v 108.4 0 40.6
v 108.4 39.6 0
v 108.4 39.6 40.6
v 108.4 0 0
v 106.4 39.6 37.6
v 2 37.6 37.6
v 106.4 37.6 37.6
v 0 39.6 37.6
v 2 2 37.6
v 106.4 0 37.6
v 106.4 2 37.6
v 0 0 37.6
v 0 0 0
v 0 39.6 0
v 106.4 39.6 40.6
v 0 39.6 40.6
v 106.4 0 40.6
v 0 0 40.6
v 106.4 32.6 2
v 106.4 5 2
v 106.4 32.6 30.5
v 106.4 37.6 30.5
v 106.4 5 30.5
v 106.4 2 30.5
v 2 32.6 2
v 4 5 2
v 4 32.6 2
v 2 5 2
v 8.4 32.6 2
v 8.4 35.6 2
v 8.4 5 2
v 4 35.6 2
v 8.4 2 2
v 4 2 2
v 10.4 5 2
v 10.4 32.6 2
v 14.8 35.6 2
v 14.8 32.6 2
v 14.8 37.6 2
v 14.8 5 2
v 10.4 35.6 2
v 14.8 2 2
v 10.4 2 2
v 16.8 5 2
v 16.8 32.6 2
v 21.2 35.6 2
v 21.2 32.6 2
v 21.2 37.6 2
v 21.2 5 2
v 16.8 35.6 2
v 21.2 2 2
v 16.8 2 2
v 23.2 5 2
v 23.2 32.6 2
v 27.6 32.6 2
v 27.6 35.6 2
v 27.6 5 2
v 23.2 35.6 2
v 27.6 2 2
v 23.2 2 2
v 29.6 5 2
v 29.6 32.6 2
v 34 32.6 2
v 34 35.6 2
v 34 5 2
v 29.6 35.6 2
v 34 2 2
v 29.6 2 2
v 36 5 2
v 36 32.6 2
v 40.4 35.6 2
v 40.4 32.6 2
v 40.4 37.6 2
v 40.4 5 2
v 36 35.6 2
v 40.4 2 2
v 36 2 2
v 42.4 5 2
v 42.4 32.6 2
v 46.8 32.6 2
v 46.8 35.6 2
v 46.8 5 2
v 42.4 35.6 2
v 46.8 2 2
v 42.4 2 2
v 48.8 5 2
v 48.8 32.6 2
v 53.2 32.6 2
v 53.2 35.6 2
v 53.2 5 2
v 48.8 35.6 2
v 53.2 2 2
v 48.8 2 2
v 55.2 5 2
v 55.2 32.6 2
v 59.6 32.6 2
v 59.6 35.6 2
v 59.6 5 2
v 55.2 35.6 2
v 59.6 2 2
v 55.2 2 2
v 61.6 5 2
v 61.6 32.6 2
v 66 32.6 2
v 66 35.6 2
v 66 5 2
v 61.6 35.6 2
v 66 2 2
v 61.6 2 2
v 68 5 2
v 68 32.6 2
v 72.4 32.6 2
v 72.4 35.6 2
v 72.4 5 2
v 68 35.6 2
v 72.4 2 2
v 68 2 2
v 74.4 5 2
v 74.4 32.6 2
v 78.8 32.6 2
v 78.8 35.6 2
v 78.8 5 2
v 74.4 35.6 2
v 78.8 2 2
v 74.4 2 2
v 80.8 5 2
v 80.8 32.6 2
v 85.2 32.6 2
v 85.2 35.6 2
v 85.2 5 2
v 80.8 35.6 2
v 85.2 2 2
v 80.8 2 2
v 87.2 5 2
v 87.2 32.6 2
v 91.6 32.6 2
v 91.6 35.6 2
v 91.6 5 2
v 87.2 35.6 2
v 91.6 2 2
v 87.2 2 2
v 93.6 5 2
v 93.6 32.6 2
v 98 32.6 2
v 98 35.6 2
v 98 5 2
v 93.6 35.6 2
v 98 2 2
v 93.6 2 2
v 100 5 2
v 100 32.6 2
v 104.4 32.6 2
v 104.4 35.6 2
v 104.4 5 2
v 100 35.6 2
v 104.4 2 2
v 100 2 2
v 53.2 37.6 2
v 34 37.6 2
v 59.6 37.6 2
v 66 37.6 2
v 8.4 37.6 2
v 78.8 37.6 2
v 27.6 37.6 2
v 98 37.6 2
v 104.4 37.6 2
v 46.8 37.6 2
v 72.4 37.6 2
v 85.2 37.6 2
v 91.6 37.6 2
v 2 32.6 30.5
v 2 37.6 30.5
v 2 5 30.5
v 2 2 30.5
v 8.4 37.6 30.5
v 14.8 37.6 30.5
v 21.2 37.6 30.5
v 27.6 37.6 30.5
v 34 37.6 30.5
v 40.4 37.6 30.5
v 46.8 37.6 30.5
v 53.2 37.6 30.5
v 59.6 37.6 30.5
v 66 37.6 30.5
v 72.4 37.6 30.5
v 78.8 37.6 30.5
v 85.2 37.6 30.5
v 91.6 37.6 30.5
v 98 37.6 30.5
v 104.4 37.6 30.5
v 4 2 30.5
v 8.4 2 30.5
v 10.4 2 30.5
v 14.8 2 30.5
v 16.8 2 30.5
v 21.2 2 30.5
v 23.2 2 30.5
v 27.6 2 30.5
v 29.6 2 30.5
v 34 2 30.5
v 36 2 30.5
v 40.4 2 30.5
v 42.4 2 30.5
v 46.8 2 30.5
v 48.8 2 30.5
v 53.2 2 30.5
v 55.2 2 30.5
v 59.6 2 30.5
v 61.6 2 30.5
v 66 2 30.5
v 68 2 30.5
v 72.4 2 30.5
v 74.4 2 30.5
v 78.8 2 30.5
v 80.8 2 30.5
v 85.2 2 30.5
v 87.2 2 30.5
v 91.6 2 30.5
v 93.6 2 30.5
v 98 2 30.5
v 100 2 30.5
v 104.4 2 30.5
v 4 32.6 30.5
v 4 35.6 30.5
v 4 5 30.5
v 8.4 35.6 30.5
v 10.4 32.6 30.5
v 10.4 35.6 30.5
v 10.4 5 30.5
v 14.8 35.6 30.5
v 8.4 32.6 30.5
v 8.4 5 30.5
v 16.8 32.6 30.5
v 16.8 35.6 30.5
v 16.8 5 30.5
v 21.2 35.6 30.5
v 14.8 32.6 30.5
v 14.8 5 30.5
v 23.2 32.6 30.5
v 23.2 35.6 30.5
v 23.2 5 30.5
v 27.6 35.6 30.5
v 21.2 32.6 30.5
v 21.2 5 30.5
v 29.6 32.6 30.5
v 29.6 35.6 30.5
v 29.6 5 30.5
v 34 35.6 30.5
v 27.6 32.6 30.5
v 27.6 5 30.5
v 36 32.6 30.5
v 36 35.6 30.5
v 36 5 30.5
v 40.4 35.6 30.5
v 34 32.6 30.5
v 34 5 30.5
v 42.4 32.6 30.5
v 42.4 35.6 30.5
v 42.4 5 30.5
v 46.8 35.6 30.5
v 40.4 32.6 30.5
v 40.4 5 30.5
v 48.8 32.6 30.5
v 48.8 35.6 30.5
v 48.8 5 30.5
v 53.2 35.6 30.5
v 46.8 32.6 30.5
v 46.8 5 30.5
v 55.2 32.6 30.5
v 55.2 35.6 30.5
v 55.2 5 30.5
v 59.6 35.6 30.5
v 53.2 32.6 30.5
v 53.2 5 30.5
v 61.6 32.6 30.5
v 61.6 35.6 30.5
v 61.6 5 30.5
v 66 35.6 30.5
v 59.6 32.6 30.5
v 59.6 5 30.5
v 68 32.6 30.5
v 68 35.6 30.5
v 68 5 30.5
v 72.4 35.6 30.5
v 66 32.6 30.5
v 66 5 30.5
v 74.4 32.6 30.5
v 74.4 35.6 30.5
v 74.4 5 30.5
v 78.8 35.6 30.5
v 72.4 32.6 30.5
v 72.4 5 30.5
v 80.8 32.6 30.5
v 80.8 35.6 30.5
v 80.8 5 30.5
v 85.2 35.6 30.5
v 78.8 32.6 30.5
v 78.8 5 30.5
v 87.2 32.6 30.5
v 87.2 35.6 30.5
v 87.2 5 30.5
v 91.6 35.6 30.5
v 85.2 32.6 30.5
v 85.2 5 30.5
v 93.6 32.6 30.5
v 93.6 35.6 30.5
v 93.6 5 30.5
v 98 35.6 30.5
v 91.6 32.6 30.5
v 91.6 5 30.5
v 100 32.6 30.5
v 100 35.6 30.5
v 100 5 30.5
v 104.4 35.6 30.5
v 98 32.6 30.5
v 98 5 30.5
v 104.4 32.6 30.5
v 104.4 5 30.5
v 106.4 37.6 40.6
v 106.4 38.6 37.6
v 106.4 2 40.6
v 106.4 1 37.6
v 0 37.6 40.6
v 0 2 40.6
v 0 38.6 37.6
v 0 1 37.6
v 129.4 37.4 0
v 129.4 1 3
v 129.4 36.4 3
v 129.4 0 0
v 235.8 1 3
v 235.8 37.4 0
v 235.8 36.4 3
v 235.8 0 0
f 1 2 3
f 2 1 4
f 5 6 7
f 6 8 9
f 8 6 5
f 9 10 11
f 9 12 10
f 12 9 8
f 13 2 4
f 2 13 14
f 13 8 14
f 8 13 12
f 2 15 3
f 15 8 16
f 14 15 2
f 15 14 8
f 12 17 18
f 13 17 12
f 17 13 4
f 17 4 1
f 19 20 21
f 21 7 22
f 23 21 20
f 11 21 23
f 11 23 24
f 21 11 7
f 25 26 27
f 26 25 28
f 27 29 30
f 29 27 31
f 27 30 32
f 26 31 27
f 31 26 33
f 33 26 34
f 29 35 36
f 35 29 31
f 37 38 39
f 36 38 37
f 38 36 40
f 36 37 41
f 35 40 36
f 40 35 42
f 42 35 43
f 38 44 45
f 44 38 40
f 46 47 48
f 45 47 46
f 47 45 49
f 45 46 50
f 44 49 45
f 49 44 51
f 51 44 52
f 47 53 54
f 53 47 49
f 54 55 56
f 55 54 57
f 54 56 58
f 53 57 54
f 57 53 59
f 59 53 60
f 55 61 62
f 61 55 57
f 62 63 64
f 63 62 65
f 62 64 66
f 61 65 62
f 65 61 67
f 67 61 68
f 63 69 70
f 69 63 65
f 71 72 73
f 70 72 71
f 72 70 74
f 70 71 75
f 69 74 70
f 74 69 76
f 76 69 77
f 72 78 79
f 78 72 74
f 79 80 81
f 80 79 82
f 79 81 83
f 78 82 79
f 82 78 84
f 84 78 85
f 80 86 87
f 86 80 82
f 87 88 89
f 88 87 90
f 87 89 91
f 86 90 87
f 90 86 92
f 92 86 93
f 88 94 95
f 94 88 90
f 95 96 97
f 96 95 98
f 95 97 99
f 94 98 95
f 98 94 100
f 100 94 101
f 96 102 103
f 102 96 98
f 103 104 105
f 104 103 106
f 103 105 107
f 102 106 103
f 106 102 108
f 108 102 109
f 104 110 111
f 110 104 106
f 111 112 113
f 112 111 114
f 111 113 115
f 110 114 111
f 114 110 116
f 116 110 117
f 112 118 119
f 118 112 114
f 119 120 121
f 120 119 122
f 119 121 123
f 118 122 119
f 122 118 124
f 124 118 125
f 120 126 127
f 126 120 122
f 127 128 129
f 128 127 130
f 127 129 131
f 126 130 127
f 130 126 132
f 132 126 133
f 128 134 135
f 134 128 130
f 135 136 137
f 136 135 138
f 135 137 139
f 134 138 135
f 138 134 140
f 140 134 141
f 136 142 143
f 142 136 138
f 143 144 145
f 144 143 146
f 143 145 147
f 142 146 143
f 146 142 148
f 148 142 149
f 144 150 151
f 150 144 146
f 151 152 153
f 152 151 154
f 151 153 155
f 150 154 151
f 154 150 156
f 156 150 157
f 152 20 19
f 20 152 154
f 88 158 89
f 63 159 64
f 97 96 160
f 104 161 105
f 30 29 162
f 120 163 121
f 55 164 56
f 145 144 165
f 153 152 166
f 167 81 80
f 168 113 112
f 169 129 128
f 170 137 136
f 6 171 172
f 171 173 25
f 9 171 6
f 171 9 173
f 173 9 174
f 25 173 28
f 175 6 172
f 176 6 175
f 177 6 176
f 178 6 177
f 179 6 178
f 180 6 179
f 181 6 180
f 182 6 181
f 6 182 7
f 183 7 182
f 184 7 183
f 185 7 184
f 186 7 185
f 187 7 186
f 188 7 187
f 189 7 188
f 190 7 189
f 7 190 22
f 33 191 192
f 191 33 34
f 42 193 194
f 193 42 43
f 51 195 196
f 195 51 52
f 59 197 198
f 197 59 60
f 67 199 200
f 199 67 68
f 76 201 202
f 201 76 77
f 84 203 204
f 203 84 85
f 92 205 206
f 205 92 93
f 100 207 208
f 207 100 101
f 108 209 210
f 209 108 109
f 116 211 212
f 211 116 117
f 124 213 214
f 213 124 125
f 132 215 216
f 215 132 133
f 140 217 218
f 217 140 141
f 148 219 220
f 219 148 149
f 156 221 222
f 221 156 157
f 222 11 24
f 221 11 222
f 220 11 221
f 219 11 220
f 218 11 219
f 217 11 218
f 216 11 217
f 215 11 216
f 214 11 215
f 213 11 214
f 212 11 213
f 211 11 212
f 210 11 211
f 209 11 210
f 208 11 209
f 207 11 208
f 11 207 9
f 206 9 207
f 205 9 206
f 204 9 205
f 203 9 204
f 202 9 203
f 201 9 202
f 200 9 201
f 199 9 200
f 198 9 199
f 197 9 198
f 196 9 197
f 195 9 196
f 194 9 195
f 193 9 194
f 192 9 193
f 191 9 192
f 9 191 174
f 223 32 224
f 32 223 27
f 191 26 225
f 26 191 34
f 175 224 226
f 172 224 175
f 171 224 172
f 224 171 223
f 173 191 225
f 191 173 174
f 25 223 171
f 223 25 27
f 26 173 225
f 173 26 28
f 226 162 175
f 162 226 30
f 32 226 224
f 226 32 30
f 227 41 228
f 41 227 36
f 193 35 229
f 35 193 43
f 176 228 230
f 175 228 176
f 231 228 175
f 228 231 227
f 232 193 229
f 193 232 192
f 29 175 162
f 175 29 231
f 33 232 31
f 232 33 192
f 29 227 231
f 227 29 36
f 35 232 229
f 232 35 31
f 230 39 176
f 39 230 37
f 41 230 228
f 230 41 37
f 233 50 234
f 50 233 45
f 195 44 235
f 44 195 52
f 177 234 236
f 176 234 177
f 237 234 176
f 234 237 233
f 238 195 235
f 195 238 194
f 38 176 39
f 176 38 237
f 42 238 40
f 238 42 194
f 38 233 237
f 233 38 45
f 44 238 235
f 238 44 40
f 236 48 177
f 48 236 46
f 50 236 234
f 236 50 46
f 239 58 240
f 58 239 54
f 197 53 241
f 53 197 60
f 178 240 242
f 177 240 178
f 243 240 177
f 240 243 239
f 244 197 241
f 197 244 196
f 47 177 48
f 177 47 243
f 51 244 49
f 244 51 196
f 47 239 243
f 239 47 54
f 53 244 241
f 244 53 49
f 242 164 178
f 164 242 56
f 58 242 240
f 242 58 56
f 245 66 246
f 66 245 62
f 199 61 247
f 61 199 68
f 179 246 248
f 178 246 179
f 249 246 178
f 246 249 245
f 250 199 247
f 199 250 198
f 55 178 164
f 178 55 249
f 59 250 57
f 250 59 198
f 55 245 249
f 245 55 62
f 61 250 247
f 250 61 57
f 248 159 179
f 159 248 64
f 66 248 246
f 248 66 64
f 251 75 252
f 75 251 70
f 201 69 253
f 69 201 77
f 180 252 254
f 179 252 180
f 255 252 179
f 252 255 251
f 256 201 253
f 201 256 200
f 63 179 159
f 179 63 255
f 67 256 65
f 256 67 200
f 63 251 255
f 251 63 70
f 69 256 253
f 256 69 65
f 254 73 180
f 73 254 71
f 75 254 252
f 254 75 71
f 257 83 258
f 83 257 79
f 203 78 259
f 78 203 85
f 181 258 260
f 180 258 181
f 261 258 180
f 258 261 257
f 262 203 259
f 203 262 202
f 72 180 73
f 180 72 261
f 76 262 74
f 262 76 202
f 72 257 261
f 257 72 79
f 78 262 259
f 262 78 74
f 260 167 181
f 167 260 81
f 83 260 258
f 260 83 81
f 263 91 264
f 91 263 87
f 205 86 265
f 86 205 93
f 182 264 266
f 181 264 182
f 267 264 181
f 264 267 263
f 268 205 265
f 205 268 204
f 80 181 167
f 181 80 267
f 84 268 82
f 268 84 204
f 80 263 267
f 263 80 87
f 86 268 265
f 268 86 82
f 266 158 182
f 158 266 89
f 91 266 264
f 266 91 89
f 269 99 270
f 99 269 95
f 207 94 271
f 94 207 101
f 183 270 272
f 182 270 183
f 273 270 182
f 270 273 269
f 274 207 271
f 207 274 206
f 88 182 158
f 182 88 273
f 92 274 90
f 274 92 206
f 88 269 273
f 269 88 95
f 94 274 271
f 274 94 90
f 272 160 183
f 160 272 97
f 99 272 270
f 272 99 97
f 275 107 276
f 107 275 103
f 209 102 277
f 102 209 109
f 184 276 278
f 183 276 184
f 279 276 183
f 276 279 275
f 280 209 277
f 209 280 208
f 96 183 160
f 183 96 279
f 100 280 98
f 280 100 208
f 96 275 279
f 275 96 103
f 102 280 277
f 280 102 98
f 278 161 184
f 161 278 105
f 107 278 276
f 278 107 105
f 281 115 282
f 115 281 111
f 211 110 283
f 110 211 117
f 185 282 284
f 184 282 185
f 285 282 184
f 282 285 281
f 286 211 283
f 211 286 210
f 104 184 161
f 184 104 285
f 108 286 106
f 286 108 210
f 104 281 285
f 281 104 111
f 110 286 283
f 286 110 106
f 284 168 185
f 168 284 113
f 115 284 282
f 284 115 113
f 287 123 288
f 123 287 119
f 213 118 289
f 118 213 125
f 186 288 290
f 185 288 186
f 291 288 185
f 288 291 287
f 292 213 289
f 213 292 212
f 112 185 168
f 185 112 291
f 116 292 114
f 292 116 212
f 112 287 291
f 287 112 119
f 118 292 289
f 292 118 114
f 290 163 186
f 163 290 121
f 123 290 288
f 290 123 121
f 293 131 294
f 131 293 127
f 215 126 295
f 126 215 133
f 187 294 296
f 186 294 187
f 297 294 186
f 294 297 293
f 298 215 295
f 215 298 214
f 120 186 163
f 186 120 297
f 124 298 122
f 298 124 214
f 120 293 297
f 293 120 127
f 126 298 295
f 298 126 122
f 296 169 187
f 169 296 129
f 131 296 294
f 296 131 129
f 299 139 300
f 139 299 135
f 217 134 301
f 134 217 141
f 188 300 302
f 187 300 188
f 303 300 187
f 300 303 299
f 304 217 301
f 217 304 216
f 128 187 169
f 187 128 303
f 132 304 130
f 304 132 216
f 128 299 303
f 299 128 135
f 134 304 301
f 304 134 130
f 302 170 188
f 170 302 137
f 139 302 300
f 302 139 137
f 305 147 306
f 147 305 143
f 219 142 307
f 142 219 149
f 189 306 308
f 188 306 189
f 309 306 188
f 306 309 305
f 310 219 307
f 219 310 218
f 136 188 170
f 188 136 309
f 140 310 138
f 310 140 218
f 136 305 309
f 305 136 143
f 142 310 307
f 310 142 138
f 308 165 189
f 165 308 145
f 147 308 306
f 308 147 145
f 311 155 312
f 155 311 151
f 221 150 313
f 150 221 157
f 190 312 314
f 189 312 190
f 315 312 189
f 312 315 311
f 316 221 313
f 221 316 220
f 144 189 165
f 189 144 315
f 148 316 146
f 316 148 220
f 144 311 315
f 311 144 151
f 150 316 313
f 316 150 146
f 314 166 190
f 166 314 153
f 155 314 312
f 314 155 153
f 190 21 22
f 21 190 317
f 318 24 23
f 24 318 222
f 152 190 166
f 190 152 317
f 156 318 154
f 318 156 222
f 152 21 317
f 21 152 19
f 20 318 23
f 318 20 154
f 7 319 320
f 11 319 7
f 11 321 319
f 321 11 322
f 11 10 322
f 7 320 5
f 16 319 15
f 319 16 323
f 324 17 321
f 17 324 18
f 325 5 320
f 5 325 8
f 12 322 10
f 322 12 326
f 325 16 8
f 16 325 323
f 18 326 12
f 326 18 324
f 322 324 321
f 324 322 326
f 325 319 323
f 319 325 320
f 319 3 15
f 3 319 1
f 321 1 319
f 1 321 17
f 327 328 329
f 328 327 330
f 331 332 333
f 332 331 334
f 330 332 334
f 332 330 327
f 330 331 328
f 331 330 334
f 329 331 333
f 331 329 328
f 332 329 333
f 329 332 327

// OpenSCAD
// in mm
divider_length = 3;
divider_width = 2;
count = 16;
wall = 2;
base = 2;
lid = 3;

/******************************** end configurable constants ********************************/
lid_clearance = 0.2;
clearance = 0.6;

// 3DS cart dimensions
thick = 3.8 + clearance;
height = 35 + clearance;
top = 35 + clearance;
tab_height = 6.5 + clearance;
width = 33 + clearance;

compartment_origin = [wall, wall, base];
compartment = [count * thick + (count + 1) * divider_width,
               top,
               height];

lid_shell = [wall + compartment[0],
             2 * wall + top,
             lid];

module cart() {
    cube ([width - clearance, height - clearance, thick - clearance]);
    translate ([width - clearance, height - tab_height, 0])
        cube ([top - width - clearance, tab_height - clearance, thick - clearance]);
}

module shell() {
    difference() {
        cube (compartment + [2 * wall, 2 * wall, base]);
        translate(compartment_origin) {
            cube (compartment);
        }
    }
}

module divider() {
    difference() {
        cube([divider_width, top, height - tab_height]);
        translate([0, divider_length, 0])
            cube([divider_width, width - 2 * divider_length, height - tab_height]);
    }
}

module slot() {
    difference() {
        cube([thick, top, height - tab_height]);
        cube([thick, width, height - tab_height]);
    }
}
module dividers() {
    translate(compartment_origin) {
        for (off = [0 : count]) {
            translate([off * (thick + divider_width), 0, 0]) {
                divider();
                if (count != off) { // draw one more divider than slots
                    translate ([divider_width, 0, 0]) slot();
                }
            }
        }
    }
}

module slide() {
    translate([0, 0, base + height]) {
        difference() {
            cube (lid_shell);
            translate ([0, wall / 2, 0]) lid();
        }
    }
    // Back edge
    translate([lid_shell[0], 0, base + height])
        cube([wall, lid_shell[1], lid]);
}

module lid(clearance = 0) {
    rotate([0,90,0])
    linear_extrude(height = lid_shell[0])
    polygon(points = 
        [[0, 0],
         [0, compartment[1] + wall - clearance],
         [-lid, compartment[1] + wall / 2 - clearance],
         [-lid, wall / 2 ]]);
}

//translate([0, 50, 0]) cart();
shell();
dividers();


translate ([compartment[0] + 25, 0, 0])
lid(lid_clearance);

slide();
